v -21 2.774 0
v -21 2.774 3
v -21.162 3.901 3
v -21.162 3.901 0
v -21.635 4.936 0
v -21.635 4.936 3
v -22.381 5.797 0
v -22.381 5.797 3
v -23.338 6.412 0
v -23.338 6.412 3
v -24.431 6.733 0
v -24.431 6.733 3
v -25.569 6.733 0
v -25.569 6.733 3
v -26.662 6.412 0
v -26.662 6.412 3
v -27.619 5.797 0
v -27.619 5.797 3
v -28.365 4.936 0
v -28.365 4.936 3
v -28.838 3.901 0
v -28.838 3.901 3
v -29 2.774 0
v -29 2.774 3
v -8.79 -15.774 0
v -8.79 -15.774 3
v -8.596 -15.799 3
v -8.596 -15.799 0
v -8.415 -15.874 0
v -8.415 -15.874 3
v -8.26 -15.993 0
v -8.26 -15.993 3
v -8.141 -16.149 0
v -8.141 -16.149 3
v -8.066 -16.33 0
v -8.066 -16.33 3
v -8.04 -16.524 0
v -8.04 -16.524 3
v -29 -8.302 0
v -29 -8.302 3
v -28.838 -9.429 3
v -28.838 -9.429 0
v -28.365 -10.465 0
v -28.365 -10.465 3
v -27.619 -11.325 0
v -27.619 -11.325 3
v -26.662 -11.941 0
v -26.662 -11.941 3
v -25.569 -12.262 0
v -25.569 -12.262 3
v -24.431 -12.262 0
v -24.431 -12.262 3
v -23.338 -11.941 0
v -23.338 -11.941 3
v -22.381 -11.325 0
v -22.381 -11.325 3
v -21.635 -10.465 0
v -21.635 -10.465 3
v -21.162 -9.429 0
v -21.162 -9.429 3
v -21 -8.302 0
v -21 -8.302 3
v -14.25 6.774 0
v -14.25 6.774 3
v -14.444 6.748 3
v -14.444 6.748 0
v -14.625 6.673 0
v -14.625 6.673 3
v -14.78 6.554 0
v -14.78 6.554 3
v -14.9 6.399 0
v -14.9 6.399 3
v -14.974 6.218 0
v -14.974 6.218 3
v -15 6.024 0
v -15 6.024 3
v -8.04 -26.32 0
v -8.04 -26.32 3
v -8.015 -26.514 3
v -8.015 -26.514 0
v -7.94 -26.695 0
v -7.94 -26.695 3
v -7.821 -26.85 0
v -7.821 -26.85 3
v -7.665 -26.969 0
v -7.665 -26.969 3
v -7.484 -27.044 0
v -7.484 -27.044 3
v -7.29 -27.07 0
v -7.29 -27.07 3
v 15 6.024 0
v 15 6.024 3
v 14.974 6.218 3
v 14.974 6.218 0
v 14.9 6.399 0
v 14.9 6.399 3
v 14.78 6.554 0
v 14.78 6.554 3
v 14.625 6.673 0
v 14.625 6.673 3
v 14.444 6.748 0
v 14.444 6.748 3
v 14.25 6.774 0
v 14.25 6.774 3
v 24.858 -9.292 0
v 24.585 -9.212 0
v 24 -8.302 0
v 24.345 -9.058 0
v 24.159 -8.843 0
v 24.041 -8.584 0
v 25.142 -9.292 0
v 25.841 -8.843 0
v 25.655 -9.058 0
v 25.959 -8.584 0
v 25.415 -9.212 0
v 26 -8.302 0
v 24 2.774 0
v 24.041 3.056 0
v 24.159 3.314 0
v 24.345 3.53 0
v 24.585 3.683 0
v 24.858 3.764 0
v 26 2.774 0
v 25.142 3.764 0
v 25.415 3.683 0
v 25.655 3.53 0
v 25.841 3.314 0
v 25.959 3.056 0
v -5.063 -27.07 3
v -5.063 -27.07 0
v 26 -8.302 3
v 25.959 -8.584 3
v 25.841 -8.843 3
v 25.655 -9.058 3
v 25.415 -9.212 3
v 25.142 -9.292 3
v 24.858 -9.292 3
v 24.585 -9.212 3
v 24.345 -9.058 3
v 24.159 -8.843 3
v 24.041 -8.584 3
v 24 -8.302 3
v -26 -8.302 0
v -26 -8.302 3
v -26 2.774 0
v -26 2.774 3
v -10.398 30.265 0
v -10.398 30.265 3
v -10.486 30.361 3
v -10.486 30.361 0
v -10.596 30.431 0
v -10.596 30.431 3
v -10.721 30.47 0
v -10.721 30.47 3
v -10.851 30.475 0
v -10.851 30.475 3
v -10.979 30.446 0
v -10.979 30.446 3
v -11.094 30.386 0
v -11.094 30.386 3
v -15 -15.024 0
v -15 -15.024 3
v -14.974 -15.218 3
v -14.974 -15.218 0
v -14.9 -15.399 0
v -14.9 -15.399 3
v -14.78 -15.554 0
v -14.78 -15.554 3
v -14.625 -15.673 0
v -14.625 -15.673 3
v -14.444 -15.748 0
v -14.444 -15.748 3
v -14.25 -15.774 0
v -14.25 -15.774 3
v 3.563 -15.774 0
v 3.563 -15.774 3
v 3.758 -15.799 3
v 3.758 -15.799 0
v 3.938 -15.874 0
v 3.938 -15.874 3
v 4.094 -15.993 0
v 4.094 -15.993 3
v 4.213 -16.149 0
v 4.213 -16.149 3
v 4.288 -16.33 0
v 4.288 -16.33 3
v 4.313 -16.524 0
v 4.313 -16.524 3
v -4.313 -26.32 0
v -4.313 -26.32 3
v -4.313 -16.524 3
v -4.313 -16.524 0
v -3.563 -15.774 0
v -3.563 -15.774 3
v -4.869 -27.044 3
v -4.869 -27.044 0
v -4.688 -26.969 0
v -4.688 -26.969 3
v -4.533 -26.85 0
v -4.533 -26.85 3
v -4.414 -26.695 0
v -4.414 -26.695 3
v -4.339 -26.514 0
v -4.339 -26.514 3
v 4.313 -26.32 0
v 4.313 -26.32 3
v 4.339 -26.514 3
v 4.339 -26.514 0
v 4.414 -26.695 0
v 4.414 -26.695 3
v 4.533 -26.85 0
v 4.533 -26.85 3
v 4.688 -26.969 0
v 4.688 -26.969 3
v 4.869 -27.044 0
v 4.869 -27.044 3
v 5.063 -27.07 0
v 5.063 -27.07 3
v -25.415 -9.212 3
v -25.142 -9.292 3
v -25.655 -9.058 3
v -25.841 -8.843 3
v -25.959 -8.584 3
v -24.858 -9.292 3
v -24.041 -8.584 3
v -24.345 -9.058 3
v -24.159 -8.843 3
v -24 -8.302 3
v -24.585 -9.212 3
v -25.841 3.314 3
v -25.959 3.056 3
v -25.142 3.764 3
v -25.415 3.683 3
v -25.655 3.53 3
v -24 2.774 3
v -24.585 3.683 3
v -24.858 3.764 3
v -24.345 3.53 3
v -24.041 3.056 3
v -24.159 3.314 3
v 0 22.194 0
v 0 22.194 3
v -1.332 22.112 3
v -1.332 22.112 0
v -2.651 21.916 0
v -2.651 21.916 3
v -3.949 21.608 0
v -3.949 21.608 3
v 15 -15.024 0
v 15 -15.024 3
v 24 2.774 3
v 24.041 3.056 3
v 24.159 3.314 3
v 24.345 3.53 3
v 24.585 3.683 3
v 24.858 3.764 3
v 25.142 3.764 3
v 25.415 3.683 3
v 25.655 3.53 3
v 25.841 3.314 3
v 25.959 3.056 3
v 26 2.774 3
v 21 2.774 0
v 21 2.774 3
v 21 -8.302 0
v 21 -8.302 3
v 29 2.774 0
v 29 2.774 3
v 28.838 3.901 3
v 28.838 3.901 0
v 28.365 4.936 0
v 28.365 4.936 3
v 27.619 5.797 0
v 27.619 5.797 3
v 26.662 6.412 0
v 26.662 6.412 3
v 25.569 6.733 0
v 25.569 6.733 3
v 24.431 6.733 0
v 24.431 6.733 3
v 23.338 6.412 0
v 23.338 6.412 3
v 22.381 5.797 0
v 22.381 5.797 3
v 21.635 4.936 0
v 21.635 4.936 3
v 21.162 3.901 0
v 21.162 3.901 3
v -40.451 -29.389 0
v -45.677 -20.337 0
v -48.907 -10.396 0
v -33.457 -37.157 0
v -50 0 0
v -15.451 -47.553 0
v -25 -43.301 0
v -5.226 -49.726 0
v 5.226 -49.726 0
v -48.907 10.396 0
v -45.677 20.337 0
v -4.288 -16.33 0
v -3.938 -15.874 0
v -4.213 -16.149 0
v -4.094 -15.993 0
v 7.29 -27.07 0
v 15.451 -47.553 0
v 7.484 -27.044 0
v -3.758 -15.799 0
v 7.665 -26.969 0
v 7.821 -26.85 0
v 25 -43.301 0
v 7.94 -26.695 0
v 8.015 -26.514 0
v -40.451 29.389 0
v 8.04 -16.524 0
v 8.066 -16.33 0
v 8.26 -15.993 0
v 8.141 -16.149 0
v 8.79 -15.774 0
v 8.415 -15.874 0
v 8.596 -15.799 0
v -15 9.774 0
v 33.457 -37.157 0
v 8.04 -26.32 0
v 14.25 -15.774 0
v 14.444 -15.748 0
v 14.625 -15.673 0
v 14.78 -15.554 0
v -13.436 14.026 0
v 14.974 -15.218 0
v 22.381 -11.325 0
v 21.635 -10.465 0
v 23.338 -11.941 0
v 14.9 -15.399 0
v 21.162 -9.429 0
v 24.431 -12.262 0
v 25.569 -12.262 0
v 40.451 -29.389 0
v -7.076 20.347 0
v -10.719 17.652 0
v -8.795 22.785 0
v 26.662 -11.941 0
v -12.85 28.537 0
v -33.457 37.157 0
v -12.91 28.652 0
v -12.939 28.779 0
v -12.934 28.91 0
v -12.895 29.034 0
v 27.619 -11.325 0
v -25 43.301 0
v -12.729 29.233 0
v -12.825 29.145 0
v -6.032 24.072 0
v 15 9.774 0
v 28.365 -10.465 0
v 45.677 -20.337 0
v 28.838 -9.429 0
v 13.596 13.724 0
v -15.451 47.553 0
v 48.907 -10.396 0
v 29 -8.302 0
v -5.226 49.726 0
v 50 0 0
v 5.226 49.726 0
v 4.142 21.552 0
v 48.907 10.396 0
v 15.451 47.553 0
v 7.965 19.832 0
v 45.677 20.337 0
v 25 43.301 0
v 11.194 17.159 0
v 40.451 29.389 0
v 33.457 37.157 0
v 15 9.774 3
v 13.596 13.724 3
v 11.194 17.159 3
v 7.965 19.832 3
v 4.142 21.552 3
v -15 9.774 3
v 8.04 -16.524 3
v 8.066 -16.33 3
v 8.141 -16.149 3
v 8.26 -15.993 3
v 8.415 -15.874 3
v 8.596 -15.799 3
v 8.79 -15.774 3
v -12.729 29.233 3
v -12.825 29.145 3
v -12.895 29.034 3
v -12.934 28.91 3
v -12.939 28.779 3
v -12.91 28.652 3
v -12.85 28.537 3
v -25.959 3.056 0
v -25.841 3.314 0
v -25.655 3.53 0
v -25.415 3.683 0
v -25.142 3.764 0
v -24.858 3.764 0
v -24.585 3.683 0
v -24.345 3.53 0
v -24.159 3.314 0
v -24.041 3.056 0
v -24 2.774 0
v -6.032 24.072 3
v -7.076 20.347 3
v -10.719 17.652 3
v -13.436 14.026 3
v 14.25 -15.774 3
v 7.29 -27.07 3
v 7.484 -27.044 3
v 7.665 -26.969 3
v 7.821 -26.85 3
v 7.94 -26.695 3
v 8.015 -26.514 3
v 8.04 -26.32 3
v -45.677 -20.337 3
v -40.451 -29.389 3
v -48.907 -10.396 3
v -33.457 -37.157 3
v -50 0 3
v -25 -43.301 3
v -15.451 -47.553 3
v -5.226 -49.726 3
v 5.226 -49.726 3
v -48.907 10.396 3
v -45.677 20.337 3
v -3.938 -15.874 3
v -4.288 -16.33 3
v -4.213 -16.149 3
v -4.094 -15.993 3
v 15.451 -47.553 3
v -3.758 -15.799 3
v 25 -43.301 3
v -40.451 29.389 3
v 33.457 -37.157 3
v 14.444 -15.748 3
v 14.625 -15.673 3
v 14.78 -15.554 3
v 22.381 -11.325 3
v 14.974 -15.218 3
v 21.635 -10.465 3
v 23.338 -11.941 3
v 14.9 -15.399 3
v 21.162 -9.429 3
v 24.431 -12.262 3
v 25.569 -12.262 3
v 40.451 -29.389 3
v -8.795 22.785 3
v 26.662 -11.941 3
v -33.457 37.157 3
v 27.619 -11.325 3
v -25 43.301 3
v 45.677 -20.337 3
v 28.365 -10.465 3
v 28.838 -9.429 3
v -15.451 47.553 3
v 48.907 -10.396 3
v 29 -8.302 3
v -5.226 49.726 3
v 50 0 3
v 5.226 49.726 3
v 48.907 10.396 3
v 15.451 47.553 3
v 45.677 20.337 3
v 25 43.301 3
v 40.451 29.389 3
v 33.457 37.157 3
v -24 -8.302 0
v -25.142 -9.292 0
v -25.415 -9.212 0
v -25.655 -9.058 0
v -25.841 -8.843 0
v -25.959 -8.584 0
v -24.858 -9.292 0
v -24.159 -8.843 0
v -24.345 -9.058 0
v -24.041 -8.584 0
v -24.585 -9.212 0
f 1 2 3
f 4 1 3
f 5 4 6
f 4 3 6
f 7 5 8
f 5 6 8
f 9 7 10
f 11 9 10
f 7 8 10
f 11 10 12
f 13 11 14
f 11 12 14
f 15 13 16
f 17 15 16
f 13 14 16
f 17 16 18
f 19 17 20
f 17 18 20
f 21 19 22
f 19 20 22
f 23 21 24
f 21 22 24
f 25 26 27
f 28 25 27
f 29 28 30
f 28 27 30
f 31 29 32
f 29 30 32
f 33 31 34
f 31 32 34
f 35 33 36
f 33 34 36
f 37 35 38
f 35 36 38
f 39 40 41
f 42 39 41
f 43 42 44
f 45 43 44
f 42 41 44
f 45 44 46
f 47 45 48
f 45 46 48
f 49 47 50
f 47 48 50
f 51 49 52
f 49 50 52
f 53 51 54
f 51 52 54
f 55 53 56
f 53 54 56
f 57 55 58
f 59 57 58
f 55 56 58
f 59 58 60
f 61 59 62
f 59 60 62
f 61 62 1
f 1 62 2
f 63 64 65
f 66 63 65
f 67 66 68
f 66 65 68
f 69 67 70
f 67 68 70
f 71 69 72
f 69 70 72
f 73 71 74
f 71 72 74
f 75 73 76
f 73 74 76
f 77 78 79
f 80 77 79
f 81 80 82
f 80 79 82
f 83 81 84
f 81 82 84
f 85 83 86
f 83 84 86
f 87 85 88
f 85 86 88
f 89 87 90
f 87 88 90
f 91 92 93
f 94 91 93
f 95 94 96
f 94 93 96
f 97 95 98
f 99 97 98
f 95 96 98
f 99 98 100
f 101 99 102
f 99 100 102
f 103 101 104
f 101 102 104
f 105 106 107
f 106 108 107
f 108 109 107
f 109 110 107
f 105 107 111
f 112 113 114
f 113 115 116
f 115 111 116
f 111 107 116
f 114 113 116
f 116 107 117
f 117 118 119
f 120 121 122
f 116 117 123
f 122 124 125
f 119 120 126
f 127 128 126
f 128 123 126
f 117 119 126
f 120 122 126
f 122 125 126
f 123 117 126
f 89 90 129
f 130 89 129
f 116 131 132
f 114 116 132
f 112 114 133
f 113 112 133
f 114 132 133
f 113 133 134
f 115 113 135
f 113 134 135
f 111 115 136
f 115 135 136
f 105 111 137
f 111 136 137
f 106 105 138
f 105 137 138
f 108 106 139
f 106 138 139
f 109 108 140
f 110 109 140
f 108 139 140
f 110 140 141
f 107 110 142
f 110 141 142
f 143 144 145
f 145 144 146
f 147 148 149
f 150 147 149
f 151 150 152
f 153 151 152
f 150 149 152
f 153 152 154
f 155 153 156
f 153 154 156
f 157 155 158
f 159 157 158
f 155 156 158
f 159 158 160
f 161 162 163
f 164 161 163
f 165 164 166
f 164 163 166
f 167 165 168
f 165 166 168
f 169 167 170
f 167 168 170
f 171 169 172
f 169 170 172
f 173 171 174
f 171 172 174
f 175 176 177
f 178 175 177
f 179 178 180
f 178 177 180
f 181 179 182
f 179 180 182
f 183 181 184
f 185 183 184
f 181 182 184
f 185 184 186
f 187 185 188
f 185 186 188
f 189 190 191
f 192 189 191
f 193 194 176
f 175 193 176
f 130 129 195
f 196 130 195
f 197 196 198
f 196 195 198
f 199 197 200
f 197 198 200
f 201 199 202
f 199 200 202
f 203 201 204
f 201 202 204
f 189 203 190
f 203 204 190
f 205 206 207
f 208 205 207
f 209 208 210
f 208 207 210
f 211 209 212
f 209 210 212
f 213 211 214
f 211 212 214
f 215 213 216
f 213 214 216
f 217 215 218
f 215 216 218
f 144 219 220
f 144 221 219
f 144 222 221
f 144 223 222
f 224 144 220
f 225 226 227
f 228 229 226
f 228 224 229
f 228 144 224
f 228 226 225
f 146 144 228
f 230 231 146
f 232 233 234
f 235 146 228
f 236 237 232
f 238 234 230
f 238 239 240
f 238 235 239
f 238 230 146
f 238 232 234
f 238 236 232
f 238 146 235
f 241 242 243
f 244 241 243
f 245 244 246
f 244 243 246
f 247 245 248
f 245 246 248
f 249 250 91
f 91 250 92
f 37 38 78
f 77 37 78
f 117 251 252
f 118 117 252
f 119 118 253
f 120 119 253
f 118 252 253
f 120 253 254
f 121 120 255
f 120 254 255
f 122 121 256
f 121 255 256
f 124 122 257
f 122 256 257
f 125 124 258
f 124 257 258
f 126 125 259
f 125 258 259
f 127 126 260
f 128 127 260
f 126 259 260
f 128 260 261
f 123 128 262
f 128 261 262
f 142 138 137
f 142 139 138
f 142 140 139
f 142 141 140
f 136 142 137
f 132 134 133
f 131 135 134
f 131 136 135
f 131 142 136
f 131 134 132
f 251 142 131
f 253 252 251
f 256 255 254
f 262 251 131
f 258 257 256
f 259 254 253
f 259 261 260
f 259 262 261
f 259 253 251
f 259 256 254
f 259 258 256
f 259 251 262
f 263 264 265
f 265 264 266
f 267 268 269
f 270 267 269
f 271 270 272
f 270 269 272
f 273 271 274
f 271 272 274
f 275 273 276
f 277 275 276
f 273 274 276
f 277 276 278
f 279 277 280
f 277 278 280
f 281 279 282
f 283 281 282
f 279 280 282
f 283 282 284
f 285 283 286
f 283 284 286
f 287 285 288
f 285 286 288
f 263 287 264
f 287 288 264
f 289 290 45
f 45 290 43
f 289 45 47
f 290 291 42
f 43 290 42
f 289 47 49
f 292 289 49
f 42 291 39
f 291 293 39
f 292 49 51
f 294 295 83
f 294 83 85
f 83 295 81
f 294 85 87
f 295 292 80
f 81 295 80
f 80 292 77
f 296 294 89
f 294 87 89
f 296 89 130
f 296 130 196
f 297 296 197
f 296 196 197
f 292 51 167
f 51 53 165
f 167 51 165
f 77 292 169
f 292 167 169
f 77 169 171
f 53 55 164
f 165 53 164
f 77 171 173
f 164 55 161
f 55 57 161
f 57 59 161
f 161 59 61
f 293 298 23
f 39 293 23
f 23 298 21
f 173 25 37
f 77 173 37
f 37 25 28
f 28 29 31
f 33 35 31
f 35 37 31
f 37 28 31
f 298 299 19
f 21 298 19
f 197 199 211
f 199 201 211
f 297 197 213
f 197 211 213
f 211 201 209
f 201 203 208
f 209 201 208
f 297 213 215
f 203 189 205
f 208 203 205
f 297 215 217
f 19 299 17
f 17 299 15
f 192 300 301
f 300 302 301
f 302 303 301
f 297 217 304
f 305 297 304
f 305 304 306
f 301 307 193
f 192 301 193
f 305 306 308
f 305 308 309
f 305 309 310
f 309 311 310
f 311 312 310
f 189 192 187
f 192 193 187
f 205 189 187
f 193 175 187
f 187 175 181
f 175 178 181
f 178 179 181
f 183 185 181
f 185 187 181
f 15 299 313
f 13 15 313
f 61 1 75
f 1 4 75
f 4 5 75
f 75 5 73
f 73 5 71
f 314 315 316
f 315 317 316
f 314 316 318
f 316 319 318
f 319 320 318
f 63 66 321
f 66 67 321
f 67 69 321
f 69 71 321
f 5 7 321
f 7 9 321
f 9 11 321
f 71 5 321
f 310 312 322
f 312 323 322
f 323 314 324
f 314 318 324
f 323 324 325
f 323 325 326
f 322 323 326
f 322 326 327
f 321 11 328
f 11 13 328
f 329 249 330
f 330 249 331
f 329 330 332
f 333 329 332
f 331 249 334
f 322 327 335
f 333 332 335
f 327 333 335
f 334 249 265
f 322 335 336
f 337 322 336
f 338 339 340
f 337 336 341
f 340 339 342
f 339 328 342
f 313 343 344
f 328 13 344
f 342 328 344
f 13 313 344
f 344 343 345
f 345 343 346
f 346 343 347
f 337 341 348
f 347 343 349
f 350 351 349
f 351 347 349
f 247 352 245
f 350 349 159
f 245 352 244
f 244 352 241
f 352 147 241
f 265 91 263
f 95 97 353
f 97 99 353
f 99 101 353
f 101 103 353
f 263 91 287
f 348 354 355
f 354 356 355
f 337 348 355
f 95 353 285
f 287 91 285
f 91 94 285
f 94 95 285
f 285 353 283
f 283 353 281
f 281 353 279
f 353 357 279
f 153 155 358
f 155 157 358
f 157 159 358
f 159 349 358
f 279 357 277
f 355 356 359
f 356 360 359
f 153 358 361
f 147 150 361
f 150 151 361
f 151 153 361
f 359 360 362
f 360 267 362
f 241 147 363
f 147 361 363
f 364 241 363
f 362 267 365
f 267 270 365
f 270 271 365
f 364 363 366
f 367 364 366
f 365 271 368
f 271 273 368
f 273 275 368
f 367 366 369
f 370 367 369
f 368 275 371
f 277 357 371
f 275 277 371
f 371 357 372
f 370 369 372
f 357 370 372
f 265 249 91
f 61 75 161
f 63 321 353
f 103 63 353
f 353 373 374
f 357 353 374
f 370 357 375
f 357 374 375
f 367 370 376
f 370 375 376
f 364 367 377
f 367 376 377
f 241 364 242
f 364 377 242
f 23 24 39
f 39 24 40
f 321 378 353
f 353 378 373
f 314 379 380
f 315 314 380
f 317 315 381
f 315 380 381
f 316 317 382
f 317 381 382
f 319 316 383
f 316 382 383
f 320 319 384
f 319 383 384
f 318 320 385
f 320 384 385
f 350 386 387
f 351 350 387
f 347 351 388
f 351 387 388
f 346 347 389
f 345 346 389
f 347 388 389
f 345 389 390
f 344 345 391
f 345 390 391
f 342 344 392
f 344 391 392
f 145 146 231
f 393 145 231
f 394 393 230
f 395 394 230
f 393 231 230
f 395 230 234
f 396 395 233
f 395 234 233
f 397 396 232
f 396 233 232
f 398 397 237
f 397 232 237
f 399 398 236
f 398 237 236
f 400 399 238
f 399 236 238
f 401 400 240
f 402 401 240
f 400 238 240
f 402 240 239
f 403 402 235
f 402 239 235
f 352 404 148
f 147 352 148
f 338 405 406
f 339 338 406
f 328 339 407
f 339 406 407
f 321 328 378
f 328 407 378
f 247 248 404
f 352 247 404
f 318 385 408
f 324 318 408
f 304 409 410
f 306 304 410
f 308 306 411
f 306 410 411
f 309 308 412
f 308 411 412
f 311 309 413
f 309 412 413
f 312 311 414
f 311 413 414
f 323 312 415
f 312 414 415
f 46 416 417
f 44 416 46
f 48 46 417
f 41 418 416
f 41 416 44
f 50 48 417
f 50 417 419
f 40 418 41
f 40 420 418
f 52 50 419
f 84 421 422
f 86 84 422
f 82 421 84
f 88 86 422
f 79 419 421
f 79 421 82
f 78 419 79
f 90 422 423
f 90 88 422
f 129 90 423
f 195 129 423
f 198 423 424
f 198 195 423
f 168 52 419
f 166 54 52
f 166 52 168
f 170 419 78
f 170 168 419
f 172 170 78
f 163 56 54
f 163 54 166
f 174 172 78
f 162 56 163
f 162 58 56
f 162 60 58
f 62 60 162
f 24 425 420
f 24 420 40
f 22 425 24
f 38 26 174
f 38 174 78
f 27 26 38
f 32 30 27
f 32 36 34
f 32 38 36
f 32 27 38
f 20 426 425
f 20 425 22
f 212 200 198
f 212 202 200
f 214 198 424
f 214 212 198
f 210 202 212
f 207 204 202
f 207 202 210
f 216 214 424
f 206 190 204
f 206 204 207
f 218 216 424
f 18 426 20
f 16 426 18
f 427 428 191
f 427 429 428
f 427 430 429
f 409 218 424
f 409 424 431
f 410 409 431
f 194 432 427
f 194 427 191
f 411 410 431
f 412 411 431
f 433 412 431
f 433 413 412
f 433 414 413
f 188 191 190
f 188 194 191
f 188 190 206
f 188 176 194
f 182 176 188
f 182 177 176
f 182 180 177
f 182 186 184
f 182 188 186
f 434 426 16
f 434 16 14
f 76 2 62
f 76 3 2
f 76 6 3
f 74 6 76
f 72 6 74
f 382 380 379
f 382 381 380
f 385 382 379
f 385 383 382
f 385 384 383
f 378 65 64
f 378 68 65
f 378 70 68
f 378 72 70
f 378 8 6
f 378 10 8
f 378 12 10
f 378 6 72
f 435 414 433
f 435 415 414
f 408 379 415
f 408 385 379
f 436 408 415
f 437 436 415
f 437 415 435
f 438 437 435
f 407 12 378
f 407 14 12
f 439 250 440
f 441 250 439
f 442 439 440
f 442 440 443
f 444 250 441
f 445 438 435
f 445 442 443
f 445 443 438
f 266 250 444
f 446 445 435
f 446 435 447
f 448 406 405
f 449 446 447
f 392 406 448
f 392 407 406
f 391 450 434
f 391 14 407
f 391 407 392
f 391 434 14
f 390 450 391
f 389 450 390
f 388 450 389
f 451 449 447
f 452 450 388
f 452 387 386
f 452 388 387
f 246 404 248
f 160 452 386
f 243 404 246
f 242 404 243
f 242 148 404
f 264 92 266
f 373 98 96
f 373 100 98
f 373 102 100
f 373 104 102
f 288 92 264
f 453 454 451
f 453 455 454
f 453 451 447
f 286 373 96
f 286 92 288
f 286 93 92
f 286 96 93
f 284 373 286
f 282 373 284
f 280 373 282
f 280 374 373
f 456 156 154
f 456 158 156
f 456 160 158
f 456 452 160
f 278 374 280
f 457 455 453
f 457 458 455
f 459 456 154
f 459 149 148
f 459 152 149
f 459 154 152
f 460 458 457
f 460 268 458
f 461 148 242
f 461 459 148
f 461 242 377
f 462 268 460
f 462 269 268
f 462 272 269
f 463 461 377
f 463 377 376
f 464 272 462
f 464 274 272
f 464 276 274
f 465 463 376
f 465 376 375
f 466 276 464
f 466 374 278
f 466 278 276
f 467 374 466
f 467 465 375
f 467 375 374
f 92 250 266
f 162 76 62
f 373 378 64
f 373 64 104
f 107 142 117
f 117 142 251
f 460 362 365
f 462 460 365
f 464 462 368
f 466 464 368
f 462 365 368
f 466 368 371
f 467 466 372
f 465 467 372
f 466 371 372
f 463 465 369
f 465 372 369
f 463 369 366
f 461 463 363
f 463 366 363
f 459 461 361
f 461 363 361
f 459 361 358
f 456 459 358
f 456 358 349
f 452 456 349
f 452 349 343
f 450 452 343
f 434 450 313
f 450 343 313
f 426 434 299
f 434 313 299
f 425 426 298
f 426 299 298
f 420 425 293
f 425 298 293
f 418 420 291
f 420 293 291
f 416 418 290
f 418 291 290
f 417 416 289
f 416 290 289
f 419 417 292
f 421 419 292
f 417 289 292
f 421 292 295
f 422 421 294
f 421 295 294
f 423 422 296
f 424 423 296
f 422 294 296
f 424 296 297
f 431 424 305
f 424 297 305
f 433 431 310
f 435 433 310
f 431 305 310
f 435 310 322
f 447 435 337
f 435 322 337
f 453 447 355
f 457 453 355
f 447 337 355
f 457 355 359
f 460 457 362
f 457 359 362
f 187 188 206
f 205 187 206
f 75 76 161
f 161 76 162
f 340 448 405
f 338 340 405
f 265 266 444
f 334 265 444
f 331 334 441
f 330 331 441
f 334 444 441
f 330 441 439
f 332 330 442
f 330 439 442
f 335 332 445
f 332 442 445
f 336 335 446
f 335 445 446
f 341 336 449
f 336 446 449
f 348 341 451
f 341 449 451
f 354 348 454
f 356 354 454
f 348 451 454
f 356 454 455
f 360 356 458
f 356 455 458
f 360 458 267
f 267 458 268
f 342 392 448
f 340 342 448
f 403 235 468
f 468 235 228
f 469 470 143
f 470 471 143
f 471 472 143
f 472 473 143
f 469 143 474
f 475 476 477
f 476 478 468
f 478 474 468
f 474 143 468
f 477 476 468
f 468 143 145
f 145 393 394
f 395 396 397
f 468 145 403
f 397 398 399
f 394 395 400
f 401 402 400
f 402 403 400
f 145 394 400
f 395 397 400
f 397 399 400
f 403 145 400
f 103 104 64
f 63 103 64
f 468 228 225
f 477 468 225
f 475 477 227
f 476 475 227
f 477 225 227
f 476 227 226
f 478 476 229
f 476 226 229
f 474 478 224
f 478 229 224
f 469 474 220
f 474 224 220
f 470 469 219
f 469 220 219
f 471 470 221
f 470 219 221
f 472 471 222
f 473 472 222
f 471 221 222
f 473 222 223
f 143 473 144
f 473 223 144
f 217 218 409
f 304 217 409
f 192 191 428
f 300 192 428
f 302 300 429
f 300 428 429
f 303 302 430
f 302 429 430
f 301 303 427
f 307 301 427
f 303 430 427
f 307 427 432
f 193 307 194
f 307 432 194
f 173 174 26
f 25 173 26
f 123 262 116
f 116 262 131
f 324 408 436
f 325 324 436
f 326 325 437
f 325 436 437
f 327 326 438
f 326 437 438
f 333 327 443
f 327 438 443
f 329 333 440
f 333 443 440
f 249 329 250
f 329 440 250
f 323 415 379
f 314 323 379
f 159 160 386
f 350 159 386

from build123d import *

# Parameters (mm, degrees)
F0_R     = 50
F2_DEPTH = 3
F4_R     = 1.5
F5_DEPTH = 3
F6_DEPTH = 3


with BuildPart() as f2:
    # F0 (on Top) → F2 (new body)
    with BuildSketch(Plane.XY):
        Circle(F0_R)
    extrude(amount=F2_DEPTH)

    # F4 (on face) → F5 (cut)
    with BuildSketch(Plane.XY.offset(3)):
        with BuildLine():
            Line((-15, 9.7737704918), (0, 9.7737704918))
            Line((0, 9.7737704918), (15, 9.7737704918))
            ThreePointArc((15, 9.7737704918), (9.6695107404, 18.6041395087), (0, 22.1944173204))
            ThreePointArc((0, 22.1944173204), (-1.9935135756, 22.0276872196), (-3.9494299266, 21.6078223243))
            ThreePointArc((-3.9494299266, 21.6078223243), (-5.5466032745, 21.0617176712), (-7.0756111193, 20.3466456428))
            ThreePointArc((-7.0756111193, 20.3466456428), (-12.2093202117, 15.9382603993), (-15, 9.7737704918))
        make_face()
        with Locations((-7.5, 16.0260769339)):
            Circle(F4_R, mode=Mode.SUBTRACT)
        with Locations((7.5, 16.0260769339)):
            Circle(F4_R, mode=Mode.SUBTRACT)
        with Locations((-7.5, 16.0260769339)):
            Circle(F4_R)
        with Locations((7.5, 16.0260769339)):
            Circle(F4_R)
        with BuildLine():
            ThreePointArc((21, -8.3022542986), (25, -12.3022542986), (29, -8.3022542986))
            Line((29, -8.3022542986), (29, 2.7737704918))
            ThreePointArc((29, 2.7737704918), (25, 6.7737704918), (21, 2.7737704918))
            Line((21, 2.7737704918), (21, -8.3022542986))
        make_face()
        with BuildLine():
            Line((26, 2.7737704918), (26, -8.3022542986))
            ThreePointArc((26, -8.3022542986), (25, -9.3022542986), (24, -8.3022542986))
            Line((24, -8.3022542986), (24, 2.7737704918))
            ThreePointArc((24, 2.7737704918), (25, 3.7737704918), (26, 2.7737704918))
        make_face(mode=Mode.SUBTRACT)
        with BuildLine():
            Line((-21, -8.3022542986), (-21, 2.7737704918))
            ThreePointArc((-21, 2.7737704918), (-25, 6.7737704918), (-29, 2.7737704918))
            Line((-29, 2.7737704918), (-29, -8.3022542986))
            ThreePointArc((-29, -8.3022542986), (-25, -12.3022542986), (-21, -8.3022542986))
        make_face()
        with BuildLine():
            Line((-26, -8.3022542986), (-26, 2.7737704918))
            ThreePointArc((-26, 2.7737704918), (-25, 3.7737704918), (-24, 2.7737704918))
            Line((-24, 2.7737704918), (-24, -8.3022542986))
            ThreePointArc((-24, -8.3022542986), (-25, -9.3022542986), (-26, -8.3022542986))
        make_face(mode=Mode.SUBTRACT)
        with BuildLine():
            Line((14.25, 6.7737704918), (0, 6.7737704918))
            Line((0, 6.7737704918), (-14.25, 6.7737704918))
            ThreePointArc((-14.25, 6.7737704918), (-14.7803300859, 6.5541005777), (-15, 6.0237704918))
            Line((-15, 6.0237704918), (-15, -15.0237704918))
            ThreePointArc((-15, -15.0237704918), (-14.7803300859, -15.5541005777), (-14.25, -15.7737704918))
            Line((-14.25, -15.7737704918), (-8.7902552709, -15.7737704918))
            ThreePointArc((-8.7902552709, -15.7737704918), (-8.259925185, -15.9934404059), (-8.0402552709, -16.5237704918))
            Line((-8.0402552709, -16.5237704918), (-8.0402552709, -26.3196417335))
            ThreePointArc((-8.0402552709, -26.3196417335), (-7.8205853568, -26.8499718194), (-7.2902552709, -27.0696417335))
            Line((-7.2902552709, -27.0696417335), (-5.0634240992, -27.0696417335))
            ThreePointArc((-5.0634240992, -27.0696417335), (-4.5330940133, -26.8499718194), (-4.3134240992, -26.3196417335))
            Line((-4.3134240992, -26.3196417335), (-4.3134240992, -16.5237704918))
            ThreePointArc((-4.3134240992, -16.5237704918), (-4.0937541851, -15.9934404059), (-3.5634240992, -15.7737704918))
            Line((-3.5634240992, -15.7737704918), (0, -15.7737704918))
            Line((0, -15.7737704918), (3.5634240992, -15.7737704918))
            ThreePointArc((3.5634240992, -15.7737704918), (4.0937541851, -15.9934404059), (4.3134240992, -16.5237704918))
            Line((4.3134240992, -16.5237704918), (4.3134240992, -26.3196417335))
            ThreePointArc((4.3134240992, -26.3196417335), (4.5330940133, -26.8499718194), (5.0634240992, -27.0696417335))
            Line((5.0634240992, -27.0696417335), (7.2902552709, -27.0696417335))
            ThreePointArc((7.2902552709, -27.0696417335), (7.8205853568, -26.8499718194), (8.0402552709, -26.3196417335))
            Line((8.0402552709, -26.3196417335), (8.0402552709, -16.5237704918))
            ThreePointArc((8.0402552709, -16.5237704918), (8.259925185, -15.9934404059), (8.7902552709, -15.7737704918))
            Line((8.7902552709, -15.7737704918), (14.25, -15.7737704918))
            ThreePointArc((14.25, -15.7737704918), (14.7803300859, -15.5541005777), (15, -15.0237704918))
            Line((15, -15.0237704918), (15, 6.0237704918))
            ThreePointArc((15, 6.0237704918), (14.7803300859, 6.5541005777), (14.25, 6.7737704918))
        make_face()
        with BuildLine():
            Line((-8.7947665615, 22.7851378335), (-7.0756111193, 20.3466456428))
            ThreePointArc((-7.0756111193, 20.3466456428), (-5.5466032745, 21.0617176712), (-3.9494299266, 21.6078223243))
            Line((-3.9494299266, 21.6078223243), (-6.0317090645, 24.0724215661))
            Line((-6.0317090645, 24.0724215661), (-10.397607046, 30.2651182078))
            ThreePointArc((-10.397607046, 30.2651182078), (-10.7210180797, 30.4696956081), (-11.0943622817, 30.3856675401))
            Line((-11.0943622817, 30.3856675401), (-12.7289714176, 29.2332557331))
            ThreePointArc((-12.7289714176, 29.2332557331), (-12.9335488179, 28.9098446994), (-12.8495207498, 28.5365004974))
            Line((-12.8495207498, 28.5365004974), (-8.7947665615, 22.7851378335))
        make_face()
    extrude(amount=-F5_DEPTH, mode=Mode.SUBTRACT)

    # F4 (on face) → F6 (cut)
    with BuildSketch(Plane.XY.offset(3)):
        with Locations((-7.5, 16.0260769339)):
            Circle(F4_R)
        with Locations((7.5, 16.0260769339)):
            Circle(F4_R)
    extrude(amount=-F6_DEPTH, mode=Mode.SUBTRACT)


solid = f2.part
